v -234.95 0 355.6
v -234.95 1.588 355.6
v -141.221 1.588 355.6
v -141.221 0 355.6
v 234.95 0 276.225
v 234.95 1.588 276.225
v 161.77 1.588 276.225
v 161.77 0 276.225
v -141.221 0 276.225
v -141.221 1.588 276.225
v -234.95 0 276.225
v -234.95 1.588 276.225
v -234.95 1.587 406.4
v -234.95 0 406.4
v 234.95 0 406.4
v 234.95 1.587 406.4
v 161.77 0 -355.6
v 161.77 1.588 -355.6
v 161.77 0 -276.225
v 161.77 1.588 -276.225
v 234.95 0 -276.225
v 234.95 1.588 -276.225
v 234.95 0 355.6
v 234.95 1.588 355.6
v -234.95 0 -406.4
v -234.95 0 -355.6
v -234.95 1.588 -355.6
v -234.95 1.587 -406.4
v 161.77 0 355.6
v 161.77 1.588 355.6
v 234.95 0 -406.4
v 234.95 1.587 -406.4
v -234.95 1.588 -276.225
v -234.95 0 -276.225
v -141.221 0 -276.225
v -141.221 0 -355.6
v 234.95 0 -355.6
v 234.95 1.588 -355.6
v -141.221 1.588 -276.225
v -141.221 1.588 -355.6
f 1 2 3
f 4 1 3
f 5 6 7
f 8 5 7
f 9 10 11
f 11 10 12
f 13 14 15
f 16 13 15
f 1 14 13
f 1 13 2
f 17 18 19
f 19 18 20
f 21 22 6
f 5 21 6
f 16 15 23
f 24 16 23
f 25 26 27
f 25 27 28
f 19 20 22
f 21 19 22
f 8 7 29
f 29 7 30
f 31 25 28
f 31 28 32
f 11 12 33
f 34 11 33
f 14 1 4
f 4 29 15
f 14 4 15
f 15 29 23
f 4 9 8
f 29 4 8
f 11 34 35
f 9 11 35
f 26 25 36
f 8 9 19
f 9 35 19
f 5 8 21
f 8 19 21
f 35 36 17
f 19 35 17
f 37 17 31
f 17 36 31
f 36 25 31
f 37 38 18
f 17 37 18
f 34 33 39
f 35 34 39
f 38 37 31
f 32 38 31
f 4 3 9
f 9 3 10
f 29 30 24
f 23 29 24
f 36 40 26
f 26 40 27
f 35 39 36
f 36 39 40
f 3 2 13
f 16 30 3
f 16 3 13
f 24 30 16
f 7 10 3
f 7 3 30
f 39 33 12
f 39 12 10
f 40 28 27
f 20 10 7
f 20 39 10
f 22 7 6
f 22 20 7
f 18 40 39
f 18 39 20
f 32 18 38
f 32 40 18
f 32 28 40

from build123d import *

# Parameters (mm, degrees)
SKETCH1_W           = 469.9
SKETCH1_H           = 812.8
BOSS_EXTRUDE1_DEPTH = 1.5875
SKETCH2_OUTSIDE_W   = 659.672
SKETCH2_OUTSIDE_H   = 1002.572
CUT_EXTRUDE1_DEPTH  = 1.5875


with BuildPart() as part:
    # Sketch1 → Boss-Extrude1 (new body)
    with BuildSketch(Plane(origin=(0, 0, 0), x_dir=(1, 0, 0), z_dir=(0, 1, 0))):
        Rectangle(SKETCH1_W, SKETCH1_H)
    extrude(amount=BOSS_EXTRUDE1_DEPTH)

    # Sketch2 outside → Cut-Extrude1 (cut)
    with BuildSketch(Plane(origin=(0, 1.5875, 0), x_dir=(1, 0, 0), z_dir=(0, 1, 0))):
        Rectangle(SKETCH2_OUTSIDE_W, SKETCH2_OUTSIDE_H)
        Polygon((-234.95, 355.6), (-234.95, 406.4), (234.95, 406.4), (234.95, 355.6), (161.769664855, 355.6), (161.769664855, 276.225), (234.95, 276.225), (234.95, -276.225), (161.769664855, -276.225), (161.769664855, -355.6), (234.95, -355.6), (234.95, -406.4), (-234.95, -406.4), (-234.95, -355.6), (-141.220731077, -355.6), (-141.220731077, -276.225), (-234.95, -276.225), (-234.95, 276.225), (-141.220731077, 276.225), (-141.220731077, 355.6), align=None, mode=Mode.SUBTRACT)
    extrude(amount=-CUT_EXTRUDE1_DEPTH, mode=Mode.SUBTRACT)


solid = part.part
